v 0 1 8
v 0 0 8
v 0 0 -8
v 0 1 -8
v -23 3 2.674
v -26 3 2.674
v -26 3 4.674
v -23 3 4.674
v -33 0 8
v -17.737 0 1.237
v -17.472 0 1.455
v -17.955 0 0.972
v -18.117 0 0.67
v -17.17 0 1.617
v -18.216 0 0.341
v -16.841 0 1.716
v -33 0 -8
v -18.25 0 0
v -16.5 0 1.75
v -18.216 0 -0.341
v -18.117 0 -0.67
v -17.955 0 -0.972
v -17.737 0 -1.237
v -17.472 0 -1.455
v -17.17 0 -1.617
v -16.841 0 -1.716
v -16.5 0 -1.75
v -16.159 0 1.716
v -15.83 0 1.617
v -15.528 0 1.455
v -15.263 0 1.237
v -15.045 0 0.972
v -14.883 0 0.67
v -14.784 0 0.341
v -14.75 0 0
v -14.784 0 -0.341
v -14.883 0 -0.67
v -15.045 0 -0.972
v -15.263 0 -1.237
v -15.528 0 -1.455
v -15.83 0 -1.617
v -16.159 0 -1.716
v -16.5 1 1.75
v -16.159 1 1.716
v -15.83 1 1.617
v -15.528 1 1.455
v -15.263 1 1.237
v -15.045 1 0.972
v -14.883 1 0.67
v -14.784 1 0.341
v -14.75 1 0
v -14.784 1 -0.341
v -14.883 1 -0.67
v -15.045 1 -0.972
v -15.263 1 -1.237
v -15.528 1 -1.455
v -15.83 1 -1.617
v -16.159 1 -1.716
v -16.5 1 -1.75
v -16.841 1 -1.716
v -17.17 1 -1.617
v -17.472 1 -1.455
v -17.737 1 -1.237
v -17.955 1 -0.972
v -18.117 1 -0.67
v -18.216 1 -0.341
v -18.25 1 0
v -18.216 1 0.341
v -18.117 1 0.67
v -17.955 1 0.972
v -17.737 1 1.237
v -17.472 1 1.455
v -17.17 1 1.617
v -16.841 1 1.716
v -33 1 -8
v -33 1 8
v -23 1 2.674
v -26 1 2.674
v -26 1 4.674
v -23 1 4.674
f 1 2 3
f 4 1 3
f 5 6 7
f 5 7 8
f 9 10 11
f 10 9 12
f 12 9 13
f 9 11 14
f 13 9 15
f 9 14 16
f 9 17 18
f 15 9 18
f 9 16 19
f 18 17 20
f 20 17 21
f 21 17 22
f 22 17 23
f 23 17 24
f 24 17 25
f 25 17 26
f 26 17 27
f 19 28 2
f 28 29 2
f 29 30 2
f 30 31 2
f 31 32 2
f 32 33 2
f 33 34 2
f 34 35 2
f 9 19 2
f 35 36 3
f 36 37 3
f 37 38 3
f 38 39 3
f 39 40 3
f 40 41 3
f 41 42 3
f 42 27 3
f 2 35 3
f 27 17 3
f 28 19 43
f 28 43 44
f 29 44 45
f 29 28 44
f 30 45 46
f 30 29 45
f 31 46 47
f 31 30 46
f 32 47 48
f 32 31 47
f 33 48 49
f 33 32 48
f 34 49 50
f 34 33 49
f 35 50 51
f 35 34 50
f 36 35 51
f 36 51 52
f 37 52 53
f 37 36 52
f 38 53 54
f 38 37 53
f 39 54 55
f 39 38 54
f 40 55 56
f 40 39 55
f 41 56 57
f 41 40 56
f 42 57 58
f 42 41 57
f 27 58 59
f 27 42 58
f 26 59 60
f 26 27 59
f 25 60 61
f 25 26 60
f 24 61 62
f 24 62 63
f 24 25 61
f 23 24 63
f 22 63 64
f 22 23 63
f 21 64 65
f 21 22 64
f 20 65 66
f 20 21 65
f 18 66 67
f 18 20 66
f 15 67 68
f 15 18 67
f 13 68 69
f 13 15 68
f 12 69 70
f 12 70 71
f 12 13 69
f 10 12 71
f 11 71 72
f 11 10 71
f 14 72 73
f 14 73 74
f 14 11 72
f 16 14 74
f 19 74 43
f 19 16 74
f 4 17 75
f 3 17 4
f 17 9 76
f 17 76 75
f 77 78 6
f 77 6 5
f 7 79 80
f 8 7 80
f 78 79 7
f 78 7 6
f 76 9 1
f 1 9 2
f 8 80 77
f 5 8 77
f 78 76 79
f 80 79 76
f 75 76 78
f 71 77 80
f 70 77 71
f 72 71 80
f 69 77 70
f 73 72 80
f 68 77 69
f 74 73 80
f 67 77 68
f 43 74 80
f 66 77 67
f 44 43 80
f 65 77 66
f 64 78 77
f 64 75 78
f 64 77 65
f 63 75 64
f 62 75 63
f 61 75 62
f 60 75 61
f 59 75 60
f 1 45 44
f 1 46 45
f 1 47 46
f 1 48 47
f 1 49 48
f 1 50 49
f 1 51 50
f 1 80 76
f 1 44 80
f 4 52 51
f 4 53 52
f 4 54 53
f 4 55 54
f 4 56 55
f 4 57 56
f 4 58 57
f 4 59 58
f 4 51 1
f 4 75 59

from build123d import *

# Parameters (mm, degrees)
SKETCH_1_W      = 33
SKETCH_1_H      = 16
SKETCH_1_R      = 1.75
EXTRUDE_1_DEPTH = 1
SKETCH_2_W      = 3
SKETCH_2_H      = 2
EXTRUDE_2_DEPTH = 3


with BuildPart() as part:
    # Эскиз1 → Бобышка-Вытянуть1 (new body)
    with BuildSketch(Plane(origin=(0, 0, 0), x_dir=(1, 0, 0), z_dir=(0, 1, 0))):
        with Locations((-16.5, 0)):
            Rectangle(SKETCH_1_W, SKETCH_1_H)
        with Locations(Location((-16.5, 0, 0), (0, 0, 270))):
            Circle(SKETCH_1_R, mode=Mode.SUBTRACT)
    extrude(amount=EXTRUDE_1_DEPTH)

    # Эскиз2 → Бобышка-Вытянуть2 (add)
    with BuildSketch(Plane(origin=(0, 0, 0), x_dir=(1, 0, 0), z_dir=(0, 1, 0))):
        with Locations((-24.5, -3.674415698)):
            Rectangle(SKETCH_2_W, SKETCH_2_H)
    extrude(amount=EXTRUDE_2_DEPTH)


solid = part.part
